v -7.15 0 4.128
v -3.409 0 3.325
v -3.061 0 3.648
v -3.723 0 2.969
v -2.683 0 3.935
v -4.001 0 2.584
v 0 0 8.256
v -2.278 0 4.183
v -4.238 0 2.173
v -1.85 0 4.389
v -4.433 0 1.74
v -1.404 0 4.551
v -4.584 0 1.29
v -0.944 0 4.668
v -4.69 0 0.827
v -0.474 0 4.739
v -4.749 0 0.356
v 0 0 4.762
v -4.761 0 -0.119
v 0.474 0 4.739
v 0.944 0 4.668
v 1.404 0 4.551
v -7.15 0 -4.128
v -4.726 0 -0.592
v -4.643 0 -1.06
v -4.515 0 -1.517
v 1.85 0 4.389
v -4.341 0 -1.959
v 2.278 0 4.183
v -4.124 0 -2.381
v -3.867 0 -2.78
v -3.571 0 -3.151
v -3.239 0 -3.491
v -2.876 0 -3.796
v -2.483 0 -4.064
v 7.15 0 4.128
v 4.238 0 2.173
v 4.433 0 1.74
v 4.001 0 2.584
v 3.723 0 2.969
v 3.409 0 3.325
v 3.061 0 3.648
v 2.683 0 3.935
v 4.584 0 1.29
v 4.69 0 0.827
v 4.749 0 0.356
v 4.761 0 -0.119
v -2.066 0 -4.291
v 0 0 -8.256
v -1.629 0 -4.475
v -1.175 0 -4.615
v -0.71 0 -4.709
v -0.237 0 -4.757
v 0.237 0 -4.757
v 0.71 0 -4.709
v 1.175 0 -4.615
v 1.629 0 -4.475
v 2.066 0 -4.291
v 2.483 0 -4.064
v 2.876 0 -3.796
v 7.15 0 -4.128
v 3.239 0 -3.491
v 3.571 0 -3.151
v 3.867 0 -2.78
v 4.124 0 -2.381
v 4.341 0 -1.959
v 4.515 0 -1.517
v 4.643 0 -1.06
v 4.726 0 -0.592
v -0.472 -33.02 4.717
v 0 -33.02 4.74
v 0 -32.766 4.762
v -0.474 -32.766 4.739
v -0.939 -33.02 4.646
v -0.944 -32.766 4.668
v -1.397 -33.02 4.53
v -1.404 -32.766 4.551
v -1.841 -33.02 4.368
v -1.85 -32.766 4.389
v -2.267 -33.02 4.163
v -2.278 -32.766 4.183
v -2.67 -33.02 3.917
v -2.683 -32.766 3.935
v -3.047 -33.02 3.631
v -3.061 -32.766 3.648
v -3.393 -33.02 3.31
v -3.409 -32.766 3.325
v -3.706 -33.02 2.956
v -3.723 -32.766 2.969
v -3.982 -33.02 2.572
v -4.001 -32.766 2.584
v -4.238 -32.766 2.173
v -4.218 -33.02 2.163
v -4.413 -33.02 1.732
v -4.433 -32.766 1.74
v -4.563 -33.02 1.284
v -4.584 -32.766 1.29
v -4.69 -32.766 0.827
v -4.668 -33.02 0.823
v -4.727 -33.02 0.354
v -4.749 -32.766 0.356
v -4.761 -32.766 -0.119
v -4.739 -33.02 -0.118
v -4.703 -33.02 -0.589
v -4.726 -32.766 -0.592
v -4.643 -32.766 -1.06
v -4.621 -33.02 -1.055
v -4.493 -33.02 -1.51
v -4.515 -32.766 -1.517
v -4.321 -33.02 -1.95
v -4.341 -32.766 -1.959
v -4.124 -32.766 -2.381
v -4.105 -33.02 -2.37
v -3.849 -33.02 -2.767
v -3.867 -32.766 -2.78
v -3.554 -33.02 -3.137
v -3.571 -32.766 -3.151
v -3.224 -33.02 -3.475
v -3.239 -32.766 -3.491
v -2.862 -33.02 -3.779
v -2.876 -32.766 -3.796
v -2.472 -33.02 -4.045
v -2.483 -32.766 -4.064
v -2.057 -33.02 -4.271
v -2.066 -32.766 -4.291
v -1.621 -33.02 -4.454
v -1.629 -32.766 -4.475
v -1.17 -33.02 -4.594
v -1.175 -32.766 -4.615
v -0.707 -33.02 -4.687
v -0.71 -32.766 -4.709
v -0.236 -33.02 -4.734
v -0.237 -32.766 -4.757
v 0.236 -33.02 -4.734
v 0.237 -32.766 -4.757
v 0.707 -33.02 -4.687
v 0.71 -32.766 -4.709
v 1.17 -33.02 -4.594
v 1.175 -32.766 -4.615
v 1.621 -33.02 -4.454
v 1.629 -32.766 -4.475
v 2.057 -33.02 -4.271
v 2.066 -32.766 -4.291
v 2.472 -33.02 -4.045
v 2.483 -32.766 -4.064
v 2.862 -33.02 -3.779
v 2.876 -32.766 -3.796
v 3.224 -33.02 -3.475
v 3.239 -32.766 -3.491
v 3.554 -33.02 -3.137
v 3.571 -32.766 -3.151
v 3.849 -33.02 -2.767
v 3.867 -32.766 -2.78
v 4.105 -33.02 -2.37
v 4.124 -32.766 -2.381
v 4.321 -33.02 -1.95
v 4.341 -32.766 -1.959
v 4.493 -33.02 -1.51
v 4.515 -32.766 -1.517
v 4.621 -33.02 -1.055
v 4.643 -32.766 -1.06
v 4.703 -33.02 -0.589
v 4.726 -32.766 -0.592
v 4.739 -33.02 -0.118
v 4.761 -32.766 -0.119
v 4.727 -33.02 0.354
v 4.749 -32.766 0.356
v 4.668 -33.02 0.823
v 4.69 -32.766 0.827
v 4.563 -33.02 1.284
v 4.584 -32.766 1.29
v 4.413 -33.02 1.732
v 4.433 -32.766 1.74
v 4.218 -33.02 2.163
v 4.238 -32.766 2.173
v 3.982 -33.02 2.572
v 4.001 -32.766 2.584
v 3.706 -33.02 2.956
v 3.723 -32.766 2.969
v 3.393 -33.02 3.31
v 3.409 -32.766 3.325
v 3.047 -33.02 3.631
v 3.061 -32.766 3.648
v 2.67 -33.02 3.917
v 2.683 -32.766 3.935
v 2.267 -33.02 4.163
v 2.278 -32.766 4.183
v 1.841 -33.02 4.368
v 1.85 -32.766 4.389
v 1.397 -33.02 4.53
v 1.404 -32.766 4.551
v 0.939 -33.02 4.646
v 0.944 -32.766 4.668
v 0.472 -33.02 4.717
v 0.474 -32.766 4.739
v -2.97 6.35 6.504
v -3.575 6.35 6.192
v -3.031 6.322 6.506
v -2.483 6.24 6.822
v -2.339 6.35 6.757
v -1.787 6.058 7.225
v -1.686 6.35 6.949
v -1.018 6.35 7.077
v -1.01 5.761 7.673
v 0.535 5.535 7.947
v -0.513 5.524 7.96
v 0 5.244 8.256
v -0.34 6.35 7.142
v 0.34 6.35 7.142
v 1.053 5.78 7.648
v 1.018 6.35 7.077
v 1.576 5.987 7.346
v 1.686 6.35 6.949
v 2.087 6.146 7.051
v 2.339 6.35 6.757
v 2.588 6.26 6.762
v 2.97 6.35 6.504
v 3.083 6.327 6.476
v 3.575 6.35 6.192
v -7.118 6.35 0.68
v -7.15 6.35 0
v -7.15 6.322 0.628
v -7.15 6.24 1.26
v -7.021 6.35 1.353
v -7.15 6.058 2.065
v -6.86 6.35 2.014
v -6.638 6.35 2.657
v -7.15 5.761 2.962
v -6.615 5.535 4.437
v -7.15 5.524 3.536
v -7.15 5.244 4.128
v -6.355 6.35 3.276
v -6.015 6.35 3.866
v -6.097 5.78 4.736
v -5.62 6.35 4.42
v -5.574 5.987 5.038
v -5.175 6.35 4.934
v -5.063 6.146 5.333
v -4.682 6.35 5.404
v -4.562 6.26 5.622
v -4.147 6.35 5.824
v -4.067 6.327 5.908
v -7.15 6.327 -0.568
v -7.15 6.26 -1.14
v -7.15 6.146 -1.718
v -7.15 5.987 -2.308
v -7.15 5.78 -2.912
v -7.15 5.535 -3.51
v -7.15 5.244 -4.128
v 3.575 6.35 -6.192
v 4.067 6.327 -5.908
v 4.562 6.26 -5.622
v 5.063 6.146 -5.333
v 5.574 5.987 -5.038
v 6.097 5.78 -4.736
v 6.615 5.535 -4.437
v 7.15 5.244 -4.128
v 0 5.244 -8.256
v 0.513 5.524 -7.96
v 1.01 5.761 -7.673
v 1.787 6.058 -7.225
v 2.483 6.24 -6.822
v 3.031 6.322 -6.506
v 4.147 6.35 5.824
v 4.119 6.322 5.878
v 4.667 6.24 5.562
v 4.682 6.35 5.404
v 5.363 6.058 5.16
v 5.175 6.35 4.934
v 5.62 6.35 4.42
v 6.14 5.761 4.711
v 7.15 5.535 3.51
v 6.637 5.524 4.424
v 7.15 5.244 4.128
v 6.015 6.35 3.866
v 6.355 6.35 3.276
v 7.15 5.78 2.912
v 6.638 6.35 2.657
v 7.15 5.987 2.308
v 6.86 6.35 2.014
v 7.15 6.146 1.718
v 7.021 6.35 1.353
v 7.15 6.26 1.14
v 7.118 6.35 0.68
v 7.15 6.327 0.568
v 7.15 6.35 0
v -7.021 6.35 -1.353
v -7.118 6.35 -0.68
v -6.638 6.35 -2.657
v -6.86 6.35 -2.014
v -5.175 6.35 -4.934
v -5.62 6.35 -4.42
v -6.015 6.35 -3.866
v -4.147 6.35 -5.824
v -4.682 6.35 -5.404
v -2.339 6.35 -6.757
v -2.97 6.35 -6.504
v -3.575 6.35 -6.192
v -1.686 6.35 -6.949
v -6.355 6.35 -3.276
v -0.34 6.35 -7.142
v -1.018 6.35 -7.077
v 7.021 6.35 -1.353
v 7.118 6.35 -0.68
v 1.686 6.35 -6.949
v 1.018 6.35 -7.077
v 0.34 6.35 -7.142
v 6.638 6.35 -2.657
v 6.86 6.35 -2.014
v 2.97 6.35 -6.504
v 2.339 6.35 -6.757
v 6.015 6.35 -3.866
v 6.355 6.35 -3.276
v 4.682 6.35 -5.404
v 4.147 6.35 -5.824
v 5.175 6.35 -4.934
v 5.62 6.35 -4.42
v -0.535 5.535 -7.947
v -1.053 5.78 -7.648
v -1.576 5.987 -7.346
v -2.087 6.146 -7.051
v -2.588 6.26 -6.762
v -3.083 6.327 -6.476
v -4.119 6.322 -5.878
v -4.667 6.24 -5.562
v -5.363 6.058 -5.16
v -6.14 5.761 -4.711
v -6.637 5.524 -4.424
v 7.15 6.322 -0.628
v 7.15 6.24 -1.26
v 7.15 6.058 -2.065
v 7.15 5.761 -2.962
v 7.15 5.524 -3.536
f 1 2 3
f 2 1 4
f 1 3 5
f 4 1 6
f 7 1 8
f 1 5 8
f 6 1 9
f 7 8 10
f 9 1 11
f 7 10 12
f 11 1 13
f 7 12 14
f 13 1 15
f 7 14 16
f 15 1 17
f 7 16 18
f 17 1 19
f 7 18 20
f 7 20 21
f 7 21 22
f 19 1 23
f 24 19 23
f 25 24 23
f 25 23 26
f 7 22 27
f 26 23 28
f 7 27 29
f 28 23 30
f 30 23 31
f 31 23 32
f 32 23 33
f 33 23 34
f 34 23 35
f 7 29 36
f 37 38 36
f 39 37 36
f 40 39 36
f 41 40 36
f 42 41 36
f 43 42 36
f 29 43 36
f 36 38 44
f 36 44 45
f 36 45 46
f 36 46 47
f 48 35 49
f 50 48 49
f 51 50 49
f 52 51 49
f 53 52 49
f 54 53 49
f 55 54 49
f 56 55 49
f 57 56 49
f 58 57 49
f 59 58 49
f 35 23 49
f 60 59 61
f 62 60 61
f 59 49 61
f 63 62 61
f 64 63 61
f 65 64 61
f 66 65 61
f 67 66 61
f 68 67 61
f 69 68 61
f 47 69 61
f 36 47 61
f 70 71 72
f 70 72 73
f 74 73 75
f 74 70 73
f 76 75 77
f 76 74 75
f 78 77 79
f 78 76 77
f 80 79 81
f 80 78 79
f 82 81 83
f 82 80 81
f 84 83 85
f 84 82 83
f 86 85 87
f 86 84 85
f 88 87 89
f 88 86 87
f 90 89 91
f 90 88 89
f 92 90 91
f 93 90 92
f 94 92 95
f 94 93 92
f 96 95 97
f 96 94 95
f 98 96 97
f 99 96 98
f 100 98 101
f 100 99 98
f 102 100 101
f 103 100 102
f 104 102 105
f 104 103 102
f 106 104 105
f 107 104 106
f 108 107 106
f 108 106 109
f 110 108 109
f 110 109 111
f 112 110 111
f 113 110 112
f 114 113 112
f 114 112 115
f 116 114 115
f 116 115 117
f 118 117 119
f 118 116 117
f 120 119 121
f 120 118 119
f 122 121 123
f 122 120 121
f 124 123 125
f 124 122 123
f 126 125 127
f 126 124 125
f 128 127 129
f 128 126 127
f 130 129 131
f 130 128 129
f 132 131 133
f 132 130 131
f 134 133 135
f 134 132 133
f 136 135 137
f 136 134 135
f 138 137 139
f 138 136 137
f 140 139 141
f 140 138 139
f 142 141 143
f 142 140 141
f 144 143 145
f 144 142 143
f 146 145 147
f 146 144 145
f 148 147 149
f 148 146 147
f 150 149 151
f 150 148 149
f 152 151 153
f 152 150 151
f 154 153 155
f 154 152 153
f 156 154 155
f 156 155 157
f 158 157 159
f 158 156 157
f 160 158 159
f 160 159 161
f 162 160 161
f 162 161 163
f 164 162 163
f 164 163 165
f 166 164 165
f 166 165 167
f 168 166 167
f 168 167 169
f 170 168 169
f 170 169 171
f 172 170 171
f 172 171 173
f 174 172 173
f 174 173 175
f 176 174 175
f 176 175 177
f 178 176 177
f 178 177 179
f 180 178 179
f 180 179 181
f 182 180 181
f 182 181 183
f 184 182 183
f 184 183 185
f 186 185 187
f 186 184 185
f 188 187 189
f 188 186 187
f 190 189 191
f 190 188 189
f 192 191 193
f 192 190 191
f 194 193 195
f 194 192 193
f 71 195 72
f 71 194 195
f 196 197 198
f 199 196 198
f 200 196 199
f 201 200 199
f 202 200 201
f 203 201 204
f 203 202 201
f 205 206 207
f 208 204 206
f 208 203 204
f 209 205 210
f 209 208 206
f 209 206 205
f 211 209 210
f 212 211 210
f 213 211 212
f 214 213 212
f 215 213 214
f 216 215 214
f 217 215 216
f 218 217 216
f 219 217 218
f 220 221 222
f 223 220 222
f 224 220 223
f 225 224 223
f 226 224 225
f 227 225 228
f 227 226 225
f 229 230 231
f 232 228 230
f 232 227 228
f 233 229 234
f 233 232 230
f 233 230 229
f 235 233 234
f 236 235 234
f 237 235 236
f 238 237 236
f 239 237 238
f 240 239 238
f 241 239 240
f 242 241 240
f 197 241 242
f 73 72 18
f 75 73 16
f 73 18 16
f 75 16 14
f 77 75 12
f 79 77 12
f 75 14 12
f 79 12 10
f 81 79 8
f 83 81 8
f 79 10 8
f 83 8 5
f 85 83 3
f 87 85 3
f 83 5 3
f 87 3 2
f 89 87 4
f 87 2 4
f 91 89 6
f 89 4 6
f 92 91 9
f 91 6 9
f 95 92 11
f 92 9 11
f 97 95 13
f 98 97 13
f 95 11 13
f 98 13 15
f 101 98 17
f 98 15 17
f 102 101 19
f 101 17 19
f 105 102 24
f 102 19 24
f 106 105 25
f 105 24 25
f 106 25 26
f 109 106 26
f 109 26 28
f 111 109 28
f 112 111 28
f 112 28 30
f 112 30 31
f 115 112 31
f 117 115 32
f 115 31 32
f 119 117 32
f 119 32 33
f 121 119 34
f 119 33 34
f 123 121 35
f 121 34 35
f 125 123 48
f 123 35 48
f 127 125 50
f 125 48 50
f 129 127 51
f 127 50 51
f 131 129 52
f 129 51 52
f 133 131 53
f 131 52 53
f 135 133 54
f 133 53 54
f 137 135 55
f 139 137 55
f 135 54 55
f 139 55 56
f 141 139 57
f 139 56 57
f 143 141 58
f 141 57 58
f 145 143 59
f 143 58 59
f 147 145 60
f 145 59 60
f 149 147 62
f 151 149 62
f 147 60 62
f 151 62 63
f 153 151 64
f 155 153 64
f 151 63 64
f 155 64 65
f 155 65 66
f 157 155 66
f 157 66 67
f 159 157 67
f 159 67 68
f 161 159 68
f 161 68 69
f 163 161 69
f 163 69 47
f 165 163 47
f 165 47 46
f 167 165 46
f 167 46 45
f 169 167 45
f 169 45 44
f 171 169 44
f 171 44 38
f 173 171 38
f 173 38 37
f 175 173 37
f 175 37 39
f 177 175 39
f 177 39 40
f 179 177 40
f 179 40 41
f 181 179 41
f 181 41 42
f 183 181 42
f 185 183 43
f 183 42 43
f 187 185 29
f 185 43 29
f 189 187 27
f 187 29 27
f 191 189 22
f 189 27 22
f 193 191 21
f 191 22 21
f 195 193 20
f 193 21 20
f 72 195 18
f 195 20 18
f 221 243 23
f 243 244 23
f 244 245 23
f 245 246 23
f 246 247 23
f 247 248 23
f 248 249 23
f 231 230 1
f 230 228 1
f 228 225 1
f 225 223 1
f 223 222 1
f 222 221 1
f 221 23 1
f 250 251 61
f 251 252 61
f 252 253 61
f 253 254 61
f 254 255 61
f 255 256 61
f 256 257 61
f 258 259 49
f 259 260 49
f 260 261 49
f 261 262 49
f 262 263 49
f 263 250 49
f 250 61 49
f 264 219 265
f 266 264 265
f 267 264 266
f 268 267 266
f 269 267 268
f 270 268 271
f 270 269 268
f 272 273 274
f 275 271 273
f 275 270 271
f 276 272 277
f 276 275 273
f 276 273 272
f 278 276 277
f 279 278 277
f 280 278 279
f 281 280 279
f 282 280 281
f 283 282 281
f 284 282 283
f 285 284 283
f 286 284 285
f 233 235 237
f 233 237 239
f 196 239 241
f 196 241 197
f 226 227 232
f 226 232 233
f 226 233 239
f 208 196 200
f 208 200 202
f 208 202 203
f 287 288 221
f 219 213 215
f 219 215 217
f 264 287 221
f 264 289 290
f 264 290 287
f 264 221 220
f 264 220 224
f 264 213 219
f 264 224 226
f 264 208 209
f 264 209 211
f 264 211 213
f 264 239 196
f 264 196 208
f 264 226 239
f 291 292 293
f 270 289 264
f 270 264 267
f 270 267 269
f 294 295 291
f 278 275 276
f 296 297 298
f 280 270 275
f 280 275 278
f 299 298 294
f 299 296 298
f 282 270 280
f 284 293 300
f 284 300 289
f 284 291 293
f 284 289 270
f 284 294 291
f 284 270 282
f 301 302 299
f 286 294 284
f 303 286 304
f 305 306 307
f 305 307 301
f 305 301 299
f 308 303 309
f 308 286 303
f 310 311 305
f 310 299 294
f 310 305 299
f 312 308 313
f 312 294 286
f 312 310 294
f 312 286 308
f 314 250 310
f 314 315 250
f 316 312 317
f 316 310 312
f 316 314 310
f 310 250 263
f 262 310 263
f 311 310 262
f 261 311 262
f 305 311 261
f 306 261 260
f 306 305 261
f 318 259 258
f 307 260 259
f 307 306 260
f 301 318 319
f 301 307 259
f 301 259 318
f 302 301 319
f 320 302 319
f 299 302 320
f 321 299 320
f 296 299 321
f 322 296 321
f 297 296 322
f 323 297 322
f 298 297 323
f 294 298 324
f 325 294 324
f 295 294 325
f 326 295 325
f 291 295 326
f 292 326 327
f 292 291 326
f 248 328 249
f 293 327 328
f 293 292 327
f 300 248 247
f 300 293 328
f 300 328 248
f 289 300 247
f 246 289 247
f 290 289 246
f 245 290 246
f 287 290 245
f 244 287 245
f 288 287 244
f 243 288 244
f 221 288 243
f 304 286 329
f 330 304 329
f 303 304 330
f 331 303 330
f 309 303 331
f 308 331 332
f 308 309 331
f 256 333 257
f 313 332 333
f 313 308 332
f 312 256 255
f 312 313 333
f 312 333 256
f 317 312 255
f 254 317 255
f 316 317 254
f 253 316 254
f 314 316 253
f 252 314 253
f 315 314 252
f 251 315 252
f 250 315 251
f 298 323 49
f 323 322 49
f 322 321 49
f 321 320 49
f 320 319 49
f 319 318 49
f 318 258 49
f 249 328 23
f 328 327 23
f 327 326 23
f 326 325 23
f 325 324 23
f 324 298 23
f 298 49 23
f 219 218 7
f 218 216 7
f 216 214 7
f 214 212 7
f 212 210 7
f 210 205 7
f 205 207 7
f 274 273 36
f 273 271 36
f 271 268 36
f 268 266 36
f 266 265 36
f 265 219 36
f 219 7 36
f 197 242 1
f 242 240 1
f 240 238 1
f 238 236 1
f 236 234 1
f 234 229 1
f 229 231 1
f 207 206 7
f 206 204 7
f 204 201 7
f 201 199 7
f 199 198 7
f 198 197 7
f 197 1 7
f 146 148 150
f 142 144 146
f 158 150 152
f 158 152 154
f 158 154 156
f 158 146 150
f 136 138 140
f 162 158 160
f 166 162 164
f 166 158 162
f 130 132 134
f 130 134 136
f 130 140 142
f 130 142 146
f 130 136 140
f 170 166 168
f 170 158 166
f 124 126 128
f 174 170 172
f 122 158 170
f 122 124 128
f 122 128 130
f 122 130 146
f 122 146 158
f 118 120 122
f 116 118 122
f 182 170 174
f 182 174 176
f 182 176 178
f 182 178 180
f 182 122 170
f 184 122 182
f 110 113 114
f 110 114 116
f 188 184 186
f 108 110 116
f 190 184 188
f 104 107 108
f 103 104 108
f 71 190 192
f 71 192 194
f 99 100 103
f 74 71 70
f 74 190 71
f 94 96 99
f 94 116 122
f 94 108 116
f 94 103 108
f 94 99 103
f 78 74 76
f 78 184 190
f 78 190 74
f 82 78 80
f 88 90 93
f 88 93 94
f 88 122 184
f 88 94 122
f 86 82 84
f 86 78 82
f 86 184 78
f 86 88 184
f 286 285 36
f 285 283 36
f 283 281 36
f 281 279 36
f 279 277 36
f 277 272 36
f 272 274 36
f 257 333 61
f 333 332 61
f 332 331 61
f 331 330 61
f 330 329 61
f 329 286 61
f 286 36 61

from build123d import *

# Parameters (mm, degrees)
BOSS_EXTRUDE1_DEPTH = 6.35
SKETCH2_R           = 4.7625
BOSS_EXTRUDE2_DEPTH = 33.02
SKETCH3_OUTSIDE_W   = 65.944
SKETCH3_OUTSIDE_H   = 68.156
SKETCH3_OUTSIDE_R   = 7.1501
CUT_EXTRUDE1_DEPTH  = 20.32
CUT_EXTRUDE1_DRAFT  = -45
CHAMFER1_SIZE       = 0.254
CHAMFER1_SIZE2      = 0.022222121


with BuildPart() as part:
    # Sketch1 → Boss-Extrude1 (new body)
    with BuildSketch(Plane(origin=(0, 0, 0), x_dir=(1, 0, 0), z_dir=(0, 1, 0))):
        Polygon((0, 8.256224319), (-7.1501, 4.12811216), (-7.1501, -4.12811216), (0, -8.256224319), (7.1501, -4.12811216), (7.1501, 4.12811216), align=None)
    extrude(amount=BOSS_EXTRUDE1_DEPTH)

    # Sketch2 → Boss-Extrude2 (add)
    with BuildSketch(Plane.XZ):
        with Locations(Location((0, 0, 0), (0, 0, 90))):
            Circle(SKETCH2_R)
    extrude(amount=BOSS_EXTRUDE2_DEPTH)


with BuildPart() as cut_extrude1_tool:
    # Sketch3 outside → Cut-Extrude1 (with draft: the straight prism first)
    with BuildSketch(Plane(origin=(0, 6.35, 0), x_dir=(1, 0, 0), z_dir=(0, 1, 0))):
        Rectangle(SKETCH3_OUTSIDE_W, SKETCH3_OUTSIDE_H)
        Circle(SKETCH3_OUTSIDE_R, mode=Mode.SUBTRACT)
    extrude(amount=-CUT_EXTRUDE1_DEPTH)
    # Cut-Extrude1: the draft: its side faces are tilted about the plane it starts from
    cut_extrude1_sides = [cut_extrude1_tool.faces().sort_by_distance(p)[0] for p in [
        (0, -3.81, 34.078),
        (32.972, -3.81, 0),
        (0, -3.81, -34.078),
        (-32.972, -3.81, 0),
        (-7.1501, -3.81, 0),
    ]]
    draft(cut_extrude1_sides, Plane(origin=(0, 6.35, 0), x_dir=(1, 0, 0), z_dir=(0, 1, 0)), CUT_EXTRUDE1_DRAFT)


with BuildPart() as part_1:
    add(part.part)

    # Cut-Extrude1: cut by cut_extrude1_tool
    add(cut_extrude1_tool.part, mode=Mode.SUBTRACT)

    # Chamfer1
    chamfer1_edges = [part_1.edges().sort_by_distance(p)[0] for p in [
        (0, -33.02, -4.7625),
    ]]
    chamfer1_side = [part_1.faces().sort_by_distance(p)[0] for p in [
        (0, -16.51, -4.7625),
    ]]
    chamfer(chamfer1_edges, length=CHAMFER1_SIZE, length2=CHAMFER1_SIZE2, reference=chamfer1_side[0])


solid = part_1.part
